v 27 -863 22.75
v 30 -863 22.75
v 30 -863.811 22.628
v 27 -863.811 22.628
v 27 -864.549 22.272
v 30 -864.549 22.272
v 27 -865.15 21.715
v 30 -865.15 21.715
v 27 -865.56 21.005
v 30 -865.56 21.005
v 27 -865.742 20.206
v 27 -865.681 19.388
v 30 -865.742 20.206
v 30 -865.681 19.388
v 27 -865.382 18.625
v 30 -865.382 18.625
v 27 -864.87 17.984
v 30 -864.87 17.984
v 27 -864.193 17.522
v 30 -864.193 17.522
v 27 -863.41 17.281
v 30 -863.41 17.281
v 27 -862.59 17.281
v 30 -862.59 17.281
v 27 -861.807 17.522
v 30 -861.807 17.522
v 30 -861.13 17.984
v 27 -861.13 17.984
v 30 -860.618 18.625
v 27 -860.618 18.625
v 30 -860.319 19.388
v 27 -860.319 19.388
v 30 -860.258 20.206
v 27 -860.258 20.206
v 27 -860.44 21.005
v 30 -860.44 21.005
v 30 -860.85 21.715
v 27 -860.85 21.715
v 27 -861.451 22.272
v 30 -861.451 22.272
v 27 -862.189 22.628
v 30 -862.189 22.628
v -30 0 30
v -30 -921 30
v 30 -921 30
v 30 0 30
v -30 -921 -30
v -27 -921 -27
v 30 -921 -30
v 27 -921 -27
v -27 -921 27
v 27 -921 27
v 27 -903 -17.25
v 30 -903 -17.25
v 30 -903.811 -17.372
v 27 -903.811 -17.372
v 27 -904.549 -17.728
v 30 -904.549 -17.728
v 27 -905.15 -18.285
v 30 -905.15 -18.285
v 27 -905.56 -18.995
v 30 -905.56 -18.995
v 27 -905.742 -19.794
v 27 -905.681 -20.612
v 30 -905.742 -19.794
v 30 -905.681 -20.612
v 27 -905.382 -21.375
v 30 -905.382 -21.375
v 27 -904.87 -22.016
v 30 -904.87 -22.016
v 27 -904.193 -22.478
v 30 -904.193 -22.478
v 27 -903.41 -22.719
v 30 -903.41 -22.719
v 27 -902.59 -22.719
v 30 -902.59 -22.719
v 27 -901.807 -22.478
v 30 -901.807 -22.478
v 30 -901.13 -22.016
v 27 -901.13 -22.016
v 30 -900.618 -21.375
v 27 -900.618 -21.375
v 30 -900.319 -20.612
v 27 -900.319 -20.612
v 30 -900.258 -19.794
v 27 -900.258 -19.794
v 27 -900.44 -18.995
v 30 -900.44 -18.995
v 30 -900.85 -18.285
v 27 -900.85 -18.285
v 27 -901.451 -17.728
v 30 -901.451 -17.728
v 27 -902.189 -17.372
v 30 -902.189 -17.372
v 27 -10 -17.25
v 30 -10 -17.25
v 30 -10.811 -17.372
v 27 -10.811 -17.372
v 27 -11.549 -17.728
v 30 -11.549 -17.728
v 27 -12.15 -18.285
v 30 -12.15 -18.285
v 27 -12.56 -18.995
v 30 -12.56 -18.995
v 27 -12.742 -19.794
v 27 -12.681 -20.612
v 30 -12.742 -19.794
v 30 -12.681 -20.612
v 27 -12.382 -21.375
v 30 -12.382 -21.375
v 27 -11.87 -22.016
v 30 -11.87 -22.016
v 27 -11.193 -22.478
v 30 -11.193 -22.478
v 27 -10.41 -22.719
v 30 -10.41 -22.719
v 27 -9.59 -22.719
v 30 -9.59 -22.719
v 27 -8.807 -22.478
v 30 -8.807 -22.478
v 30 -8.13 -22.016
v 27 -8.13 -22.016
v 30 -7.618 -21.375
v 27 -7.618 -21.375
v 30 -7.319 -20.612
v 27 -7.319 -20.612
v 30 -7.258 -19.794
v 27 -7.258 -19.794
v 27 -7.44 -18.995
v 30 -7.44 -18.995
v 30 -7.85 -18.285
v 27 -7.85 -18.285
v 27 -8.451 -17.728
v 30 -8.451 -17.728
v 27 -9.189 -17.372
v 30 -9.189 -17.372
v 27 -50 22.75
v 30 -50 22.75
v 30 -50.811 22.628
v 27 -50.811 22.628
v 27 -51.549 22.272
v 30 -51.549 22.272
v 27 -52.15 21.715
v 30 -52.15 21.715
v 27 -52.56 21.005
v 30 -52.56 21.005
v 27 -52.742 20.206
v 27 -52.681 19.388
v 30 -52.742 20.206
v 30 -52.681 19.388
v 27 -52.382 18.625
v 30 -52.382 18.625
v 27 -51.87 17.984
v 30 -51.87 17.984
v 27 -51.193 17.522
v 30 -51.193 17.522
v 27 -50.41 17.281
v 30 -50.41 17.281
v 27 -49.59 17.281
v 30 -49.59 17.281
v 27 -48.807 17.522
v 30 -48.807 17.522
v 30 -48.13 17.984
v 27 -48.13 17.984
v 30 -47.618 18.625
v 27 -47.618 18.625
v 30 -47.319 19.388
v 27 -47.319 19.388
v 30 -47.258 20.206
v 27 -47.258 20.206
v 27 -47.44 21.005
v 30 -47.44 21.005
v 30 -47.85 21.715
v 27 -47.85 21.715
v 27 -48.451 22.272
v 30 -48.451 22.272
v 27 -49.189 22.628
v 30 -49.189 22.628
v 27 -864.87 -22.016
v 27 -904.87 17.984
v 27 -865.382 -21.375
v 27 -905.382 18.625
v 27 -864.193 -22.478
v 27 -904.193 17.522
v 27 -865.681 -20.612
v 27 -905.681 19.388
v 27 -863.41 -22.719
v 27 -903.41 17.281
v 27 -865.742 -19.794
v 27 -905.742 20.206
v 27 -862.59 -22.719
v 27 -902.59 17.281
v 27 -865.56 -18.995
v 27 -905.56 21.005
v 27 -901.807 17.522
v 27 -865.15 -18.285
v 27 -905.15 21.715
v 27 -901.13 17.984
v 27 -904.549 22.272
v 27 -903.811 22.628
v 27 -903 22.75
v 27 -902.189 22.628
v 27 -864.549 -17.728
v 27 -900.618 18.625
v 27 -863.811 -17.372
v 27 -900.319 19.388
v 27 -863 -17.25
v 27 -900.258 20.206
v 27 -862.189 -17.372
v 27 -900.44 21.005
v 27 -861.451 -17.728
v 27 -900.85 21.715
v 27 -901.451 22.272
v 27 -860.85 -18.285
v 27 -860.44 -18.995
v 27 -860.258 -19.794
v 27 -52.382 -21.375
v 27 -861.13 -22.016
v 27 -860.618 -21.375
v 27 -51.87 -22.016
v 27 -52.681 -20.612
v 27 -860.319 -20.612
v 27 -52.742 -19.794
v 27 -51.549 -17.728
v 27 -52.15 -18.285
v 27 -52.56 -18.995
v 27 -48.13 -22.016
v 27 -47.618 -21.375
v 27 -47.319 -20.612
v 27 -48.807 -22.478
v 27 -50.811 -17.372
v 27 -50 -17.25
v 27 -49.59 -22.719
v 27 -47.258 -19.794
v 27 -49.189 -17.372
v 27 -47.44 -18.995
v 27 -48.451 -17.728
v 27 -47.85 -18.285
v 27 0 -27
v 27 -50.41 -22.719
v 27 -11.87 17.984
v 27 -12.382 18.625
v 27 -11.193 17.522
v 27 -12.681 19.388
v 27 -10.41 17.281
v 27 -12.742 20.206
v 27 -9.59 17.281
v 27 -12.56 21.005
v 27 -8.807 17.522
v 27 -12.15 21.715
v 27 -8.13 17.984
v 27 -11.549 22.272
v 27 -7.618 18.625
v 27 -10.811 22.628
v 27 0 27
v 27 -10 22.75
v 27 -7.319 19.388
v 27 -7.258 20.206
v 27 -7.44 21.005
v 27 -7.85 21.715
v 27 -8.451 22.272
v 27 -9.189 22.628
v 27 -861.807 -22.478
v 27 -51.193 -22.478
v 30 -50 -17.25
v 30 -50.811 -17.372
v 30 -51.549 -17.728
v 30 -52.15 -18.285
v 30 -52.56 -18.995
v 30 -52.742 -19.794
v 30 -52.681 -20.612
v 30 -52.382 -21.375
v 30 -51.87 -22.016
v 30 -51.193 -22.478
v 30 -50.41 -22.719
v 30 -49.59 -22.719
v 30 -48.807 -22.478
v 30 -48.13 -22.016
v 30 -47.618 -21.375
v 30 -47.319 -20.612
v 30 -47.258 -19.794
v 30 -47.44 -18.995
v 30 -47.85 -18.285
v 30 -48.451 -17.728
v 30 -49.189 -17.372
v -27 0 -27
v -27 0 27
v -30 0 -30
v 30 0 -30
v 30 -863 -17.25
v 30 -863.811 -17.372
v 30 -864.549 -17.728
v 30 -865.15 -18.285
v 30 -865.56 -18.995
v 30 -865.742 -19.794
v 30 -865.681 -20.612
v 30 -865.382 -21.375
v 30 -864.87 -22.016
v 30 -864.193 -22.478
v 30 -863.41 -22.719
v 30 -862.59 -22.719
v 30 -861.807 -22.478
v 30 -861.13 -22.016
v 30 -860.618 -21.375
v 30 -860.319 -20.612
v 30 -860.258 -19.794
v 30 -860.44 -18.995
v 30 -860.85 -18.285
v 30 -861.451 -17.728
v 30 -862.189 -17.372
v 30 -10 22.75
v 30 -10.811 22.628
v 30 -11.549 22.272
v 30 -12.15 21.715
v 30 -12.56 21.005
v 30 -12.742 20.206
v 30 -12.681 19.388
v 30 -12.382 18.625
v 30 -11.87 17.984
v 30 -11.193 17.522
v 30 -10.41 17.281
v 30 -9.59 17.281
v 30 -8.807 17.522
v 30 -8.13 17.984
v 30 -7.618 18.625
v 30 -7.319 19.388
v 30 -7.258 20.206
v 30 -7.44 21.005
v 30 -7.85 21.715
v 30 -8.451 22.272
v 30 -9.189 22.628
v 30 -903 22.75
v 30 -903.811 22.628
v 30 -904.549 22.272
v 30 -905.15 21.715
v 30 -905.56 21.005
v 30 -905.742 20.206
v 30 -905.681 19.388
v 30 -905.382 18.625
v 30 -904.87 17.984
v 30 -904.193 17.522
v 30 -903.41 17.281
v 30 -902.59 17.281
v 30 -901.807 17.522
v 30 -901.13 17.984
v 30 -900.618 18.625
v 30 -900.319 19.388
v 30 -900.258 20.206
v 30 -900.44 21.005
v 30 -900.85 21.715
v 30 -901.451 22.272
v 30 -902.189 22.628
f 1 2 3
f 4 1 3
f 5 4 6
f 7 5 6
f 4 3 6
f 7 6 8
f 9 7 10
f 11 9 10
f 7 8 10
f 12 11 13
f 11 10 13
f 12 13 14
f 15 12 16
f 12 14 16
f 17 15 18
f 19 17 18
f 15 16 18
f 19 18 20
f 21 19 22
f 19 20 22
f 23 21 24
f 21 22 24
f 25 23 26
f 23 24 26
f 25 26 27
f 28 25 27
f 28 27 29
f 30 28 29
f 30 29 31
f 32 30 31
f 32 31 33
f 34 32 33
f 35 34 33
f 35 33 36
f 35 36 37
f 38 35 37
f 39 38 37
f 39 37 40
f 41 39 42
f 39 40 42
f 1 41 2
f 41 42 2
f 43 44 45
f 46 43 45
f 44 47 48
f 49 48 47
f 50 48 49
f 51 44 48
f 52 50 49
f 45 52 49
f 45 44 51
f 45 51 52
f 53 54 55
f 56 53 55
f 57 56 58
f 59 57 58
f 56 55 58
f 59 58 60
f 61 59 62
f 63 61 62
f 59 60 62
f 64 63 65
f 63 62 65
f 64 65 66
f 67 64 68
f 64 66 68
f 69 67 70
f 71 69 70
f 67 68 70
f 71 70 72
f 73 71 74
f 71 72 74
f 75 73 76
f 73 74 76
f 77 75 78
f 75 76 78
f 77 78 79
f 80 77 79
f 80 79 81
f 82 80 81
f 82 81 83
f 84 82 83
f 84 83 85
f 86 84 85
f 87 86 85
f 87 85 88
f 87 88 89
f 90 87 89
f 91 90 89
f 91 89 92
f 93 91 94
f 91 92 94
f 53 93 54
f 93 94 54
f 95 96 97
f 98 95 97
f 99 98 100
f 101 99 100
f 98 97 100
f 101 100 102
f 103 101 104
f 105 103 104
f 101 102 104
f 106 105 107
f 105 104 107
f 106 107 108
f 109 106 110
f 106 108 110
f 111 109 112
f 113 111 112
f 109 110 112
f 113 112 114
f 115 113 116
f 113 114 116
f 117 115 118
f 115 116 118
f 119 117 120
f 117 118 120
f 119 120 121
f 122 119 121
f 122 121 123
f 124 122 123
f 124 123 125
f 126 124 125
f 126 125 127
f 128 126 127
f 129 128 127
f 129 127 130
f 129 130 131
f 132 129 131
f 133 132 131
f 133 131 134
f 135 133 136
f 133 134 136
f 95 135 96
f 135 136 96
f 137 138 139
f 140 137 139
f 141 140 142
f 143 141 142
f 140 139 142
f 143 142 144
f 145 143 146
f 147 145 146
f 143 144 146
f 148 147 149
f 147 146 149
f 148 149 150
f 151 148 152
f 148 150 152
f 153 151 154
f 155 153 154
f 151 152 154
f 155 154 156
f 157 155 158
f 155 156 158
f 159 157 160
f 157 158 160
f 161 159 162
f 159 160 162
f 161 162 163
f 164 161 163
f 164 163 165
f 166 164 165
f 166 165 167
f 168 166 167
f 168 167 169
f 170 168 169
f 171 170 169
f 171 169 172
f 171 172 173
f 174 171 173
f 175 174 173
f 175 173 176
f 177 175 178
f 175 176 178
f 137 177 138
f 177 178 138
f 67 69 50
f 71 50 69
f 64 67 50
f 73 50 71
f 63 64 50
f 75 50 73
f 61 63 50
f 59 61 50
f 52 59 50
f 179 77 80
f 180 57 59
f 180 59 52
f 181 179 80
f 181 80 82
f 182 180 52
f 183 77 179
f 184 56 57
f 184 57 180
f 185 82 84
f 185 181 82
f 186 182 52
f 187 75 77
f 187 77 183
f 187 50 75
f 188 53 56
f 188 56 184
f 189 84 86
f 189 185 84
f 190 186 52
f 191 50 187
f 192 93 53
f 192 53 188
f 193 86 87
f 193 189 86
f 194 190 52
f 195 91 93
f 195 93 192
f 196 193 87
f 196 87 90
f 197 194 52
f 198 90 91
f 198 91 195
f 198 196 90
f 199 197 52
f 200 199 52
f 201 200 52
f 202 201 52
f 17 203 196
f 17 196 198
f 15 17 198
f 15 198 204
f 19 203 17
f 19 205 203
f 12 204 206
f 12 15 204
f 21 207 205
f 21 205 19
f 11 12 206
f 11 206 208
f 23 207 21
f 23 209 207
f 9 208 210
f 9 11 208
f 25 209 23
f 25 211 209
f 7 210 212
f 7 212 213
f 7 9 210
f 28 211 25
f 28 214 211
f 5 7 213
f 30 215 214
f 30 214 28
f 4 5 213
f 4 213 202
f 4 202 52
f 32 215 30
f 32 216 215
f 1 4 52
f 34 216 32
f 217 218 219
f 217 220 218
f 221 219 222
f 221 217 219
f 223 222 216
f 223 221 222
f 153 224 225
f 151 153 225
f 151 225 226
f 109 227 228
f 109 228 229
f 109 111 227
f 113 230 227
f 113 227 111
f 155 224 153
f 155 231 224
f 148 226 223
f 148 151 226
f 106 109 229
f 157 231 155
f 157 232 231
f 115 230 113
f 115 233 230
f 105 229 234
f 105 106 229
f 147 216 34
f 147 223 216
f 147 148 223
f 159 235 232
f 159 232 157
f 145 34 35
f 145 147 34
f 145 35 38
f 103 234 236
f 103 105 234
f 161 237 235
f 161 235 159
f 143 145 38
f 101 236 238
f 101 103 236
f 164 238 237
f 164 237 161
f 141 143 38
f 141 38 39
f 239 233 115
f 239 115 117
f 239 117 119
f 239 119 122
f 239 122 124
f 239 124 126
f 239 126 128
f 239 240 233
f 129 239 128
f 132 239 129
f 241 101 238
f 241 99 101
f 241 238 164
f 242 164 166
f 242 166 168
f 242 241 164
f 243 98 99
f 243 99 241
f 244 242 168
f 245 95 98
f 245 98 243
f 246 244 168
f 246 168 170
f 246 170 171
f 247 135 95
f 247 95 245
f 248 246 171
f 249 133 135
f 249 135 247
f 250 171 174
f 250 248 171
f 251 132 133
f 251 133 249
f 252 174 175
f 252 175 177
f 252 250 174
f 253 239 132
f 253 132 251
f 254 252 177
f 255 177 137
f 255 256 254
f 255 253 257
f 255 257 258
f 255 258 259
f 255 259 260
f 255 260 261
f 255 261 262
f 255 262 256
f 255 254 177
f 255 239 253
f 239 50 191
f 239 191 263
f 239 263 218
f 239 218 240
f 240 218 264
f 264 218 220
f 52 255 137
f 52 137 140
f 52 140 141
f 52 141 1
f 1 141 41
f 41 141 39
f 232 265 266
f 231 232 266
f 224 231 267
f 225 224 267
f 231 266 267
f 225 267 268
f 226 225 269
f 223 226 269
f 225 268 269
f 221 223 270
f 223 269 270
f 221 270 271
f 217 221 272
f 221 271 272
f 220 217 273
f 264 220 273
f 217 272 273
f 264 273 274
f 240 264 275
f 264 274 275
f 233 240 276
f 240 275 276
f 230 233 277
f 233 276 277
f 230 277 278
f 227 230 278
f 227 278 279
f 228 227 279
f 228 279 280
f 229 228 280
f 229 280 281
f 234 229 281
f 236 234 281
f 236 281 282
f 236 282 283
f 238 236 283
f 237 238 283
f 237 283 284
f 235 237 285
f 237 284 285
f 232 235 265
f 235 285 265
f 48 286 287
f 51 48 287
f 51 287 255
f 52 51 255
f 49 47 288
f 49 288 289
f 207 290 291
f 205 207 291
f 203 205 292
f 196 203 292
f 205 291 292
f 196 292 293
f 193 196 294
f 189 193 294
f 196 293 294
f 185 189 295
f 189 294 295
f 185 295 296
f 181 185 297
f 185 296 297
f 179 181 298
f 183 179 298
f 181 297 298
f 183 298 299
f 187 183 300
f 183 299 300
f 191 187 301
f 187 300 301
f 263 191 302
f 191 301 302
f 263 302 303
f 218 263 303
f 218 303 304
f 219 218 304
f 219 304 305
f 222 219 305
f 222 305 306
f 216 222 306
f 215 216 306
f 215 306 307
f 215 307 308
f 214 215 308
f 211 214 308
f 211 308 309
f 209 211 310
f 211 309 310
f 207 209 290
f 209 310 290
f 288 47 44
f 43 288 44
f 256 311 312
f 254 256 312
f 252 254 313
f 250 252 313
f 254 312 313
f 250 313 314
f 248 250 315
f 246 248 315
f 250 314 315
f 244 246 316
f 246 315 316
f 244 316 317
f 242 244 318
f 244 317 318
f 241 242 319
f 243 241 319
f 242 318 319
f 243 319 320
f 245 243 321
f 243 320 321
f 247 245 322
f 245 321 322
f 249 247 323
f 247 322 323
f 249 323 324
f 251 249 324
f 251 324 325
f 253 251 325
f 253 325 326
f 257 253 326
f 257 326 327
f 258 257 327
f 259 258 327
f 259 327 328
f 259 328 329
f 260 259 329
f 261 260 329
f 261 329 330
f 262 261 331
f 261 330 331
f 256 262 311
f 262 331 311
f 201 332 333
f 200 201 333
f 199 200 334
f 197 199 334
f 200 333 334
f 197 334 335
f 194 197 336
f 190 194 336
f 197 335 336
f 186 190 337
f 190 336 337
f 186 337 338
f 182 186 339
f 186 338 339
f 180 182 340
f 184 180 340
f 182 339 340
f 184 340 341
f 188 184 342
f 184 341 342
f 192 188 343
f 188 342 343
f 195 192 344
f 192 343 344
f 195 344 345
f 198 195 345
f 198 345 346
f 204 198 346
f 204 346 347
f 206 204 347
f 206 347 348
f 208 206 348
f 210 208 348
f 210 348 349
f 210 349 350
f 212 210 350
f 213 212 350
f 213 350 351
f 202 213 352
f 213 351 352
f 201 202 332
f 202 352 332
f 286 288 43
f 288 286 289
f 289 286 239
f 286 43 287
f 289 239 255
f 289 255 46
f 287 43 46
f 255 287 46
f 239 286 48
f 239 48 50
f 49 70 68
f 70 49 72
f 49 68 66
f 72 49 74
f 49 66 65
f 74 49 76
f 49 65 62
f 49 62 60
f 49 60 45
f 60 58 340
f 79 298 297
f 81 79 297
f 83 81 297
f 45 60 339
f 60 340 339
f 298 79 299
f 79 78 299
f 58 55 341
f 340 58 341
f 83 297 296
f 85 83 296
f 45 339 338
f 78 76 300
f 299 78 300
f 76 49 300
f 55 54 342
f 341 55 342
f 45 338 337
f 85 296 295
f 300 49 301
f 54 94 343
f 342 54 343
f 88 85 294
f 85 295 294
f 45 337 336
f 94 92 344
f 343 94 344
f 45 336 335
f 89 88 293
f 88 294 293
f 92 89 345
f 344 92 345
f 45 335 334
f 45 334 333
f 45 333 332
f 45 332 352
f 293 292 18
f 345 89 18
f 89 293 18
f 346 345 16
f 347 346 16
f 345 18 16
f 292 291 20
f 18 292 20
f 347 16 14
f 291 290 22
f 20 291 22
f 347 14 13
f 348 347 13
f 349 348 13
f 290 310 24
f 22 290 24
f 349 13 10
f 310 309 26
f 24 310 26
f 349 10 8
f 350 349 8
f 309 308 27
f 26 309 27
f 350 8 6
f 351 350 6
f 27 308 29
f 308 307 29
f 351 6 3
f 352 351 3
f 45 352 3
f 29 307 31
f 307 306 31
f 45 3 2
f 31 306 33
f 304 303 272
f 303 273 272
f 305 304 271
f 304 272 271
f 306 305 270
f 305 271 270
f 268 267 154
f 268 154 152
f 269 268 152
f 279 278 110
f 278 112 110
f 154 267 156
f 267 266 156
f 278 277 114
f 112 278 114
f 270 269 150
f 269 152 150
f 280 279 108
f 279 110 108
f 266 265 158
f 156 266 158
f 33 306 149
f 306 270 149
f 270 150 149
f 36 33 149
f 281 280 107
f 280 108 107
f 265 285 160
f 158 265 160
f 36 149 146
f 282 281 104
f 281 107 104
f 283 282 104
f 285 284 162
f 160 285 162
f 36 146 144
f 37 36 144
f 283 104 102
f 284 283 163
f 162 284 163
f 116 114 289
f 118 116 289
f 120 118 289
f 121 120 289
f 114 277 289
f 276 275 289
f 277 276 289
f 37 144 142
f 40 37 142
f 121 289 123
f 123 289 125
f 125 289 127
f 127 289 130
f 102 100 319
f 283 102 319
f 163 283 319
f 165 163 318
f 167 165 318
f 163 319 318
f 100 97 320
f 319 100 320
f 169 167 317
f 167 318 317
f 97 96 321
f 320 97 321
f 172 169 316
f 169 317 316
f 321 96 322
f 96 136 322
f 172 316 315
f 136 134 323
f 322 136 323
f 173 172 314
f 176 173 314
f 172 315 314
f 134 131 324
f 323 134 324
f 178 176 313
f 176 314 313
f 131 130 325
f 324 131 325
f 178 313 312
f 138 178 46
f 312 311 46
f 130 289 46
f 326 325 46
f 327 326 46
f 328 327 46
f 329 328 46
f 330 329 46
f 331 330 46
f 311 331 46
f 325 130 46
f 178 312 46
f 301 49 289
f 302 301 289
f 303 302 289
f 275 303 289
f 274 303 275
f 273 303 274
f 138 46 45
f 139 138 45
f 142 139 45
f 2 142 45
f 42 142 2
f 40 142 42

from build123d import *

# Parameters (mm, degrees)
SKETCH_W     = 60
SKETCH_H     = 60
SKETCH_W_2   = 54
SKETCH_H_2   = 54
PAD_DEPTH    = 921
SKETCH002_R  = 2.75
POCKET_DEPTH = 3


with BuildPart() as part:
    # Sketch → Pad (new body)
    with BuildSketch(Plane.XZ):
        Rectangle(SKETCH_W, SKETCH_H)
        Rectangle(SKETCH_W_2, SKETCH_H_2, mode=Mode.SUBTRACT)
    extrude(amount=PAD_DEPTH)

    # Sketch002 (on Face2 of Pad) → Pocket (cut)
    with BuildSketch(Plane(origin=(30, 0, 0), x_dir=(0, 0, 1), z_dir=(1, 0, 0))):
        with Locations((-20, 50)):
            Circle(SKETCH002_R)
        with Locations((20, 50)):
            Circle(SKETCH002_R)
        with Locations((-20, 10)):
            Circle(SKETCH002_R)
        with Locations((20, 10)):
            Circle(SKETCH002_R)
        with Locations((-20, 903)):
            Circle(SKETCH002_R)
        with Locations((20, 903)):
            Circle(SKETCH002_R)
        with Locations((-20, 863)):
            Circle(SKETCH002_R)
        with Locations((20, 863)):
            Circle(SKETCH002_R)
    extrude(amount=-POCKET_DEPTH, mode=Mode.SUBTRACT)


solid = part.part
